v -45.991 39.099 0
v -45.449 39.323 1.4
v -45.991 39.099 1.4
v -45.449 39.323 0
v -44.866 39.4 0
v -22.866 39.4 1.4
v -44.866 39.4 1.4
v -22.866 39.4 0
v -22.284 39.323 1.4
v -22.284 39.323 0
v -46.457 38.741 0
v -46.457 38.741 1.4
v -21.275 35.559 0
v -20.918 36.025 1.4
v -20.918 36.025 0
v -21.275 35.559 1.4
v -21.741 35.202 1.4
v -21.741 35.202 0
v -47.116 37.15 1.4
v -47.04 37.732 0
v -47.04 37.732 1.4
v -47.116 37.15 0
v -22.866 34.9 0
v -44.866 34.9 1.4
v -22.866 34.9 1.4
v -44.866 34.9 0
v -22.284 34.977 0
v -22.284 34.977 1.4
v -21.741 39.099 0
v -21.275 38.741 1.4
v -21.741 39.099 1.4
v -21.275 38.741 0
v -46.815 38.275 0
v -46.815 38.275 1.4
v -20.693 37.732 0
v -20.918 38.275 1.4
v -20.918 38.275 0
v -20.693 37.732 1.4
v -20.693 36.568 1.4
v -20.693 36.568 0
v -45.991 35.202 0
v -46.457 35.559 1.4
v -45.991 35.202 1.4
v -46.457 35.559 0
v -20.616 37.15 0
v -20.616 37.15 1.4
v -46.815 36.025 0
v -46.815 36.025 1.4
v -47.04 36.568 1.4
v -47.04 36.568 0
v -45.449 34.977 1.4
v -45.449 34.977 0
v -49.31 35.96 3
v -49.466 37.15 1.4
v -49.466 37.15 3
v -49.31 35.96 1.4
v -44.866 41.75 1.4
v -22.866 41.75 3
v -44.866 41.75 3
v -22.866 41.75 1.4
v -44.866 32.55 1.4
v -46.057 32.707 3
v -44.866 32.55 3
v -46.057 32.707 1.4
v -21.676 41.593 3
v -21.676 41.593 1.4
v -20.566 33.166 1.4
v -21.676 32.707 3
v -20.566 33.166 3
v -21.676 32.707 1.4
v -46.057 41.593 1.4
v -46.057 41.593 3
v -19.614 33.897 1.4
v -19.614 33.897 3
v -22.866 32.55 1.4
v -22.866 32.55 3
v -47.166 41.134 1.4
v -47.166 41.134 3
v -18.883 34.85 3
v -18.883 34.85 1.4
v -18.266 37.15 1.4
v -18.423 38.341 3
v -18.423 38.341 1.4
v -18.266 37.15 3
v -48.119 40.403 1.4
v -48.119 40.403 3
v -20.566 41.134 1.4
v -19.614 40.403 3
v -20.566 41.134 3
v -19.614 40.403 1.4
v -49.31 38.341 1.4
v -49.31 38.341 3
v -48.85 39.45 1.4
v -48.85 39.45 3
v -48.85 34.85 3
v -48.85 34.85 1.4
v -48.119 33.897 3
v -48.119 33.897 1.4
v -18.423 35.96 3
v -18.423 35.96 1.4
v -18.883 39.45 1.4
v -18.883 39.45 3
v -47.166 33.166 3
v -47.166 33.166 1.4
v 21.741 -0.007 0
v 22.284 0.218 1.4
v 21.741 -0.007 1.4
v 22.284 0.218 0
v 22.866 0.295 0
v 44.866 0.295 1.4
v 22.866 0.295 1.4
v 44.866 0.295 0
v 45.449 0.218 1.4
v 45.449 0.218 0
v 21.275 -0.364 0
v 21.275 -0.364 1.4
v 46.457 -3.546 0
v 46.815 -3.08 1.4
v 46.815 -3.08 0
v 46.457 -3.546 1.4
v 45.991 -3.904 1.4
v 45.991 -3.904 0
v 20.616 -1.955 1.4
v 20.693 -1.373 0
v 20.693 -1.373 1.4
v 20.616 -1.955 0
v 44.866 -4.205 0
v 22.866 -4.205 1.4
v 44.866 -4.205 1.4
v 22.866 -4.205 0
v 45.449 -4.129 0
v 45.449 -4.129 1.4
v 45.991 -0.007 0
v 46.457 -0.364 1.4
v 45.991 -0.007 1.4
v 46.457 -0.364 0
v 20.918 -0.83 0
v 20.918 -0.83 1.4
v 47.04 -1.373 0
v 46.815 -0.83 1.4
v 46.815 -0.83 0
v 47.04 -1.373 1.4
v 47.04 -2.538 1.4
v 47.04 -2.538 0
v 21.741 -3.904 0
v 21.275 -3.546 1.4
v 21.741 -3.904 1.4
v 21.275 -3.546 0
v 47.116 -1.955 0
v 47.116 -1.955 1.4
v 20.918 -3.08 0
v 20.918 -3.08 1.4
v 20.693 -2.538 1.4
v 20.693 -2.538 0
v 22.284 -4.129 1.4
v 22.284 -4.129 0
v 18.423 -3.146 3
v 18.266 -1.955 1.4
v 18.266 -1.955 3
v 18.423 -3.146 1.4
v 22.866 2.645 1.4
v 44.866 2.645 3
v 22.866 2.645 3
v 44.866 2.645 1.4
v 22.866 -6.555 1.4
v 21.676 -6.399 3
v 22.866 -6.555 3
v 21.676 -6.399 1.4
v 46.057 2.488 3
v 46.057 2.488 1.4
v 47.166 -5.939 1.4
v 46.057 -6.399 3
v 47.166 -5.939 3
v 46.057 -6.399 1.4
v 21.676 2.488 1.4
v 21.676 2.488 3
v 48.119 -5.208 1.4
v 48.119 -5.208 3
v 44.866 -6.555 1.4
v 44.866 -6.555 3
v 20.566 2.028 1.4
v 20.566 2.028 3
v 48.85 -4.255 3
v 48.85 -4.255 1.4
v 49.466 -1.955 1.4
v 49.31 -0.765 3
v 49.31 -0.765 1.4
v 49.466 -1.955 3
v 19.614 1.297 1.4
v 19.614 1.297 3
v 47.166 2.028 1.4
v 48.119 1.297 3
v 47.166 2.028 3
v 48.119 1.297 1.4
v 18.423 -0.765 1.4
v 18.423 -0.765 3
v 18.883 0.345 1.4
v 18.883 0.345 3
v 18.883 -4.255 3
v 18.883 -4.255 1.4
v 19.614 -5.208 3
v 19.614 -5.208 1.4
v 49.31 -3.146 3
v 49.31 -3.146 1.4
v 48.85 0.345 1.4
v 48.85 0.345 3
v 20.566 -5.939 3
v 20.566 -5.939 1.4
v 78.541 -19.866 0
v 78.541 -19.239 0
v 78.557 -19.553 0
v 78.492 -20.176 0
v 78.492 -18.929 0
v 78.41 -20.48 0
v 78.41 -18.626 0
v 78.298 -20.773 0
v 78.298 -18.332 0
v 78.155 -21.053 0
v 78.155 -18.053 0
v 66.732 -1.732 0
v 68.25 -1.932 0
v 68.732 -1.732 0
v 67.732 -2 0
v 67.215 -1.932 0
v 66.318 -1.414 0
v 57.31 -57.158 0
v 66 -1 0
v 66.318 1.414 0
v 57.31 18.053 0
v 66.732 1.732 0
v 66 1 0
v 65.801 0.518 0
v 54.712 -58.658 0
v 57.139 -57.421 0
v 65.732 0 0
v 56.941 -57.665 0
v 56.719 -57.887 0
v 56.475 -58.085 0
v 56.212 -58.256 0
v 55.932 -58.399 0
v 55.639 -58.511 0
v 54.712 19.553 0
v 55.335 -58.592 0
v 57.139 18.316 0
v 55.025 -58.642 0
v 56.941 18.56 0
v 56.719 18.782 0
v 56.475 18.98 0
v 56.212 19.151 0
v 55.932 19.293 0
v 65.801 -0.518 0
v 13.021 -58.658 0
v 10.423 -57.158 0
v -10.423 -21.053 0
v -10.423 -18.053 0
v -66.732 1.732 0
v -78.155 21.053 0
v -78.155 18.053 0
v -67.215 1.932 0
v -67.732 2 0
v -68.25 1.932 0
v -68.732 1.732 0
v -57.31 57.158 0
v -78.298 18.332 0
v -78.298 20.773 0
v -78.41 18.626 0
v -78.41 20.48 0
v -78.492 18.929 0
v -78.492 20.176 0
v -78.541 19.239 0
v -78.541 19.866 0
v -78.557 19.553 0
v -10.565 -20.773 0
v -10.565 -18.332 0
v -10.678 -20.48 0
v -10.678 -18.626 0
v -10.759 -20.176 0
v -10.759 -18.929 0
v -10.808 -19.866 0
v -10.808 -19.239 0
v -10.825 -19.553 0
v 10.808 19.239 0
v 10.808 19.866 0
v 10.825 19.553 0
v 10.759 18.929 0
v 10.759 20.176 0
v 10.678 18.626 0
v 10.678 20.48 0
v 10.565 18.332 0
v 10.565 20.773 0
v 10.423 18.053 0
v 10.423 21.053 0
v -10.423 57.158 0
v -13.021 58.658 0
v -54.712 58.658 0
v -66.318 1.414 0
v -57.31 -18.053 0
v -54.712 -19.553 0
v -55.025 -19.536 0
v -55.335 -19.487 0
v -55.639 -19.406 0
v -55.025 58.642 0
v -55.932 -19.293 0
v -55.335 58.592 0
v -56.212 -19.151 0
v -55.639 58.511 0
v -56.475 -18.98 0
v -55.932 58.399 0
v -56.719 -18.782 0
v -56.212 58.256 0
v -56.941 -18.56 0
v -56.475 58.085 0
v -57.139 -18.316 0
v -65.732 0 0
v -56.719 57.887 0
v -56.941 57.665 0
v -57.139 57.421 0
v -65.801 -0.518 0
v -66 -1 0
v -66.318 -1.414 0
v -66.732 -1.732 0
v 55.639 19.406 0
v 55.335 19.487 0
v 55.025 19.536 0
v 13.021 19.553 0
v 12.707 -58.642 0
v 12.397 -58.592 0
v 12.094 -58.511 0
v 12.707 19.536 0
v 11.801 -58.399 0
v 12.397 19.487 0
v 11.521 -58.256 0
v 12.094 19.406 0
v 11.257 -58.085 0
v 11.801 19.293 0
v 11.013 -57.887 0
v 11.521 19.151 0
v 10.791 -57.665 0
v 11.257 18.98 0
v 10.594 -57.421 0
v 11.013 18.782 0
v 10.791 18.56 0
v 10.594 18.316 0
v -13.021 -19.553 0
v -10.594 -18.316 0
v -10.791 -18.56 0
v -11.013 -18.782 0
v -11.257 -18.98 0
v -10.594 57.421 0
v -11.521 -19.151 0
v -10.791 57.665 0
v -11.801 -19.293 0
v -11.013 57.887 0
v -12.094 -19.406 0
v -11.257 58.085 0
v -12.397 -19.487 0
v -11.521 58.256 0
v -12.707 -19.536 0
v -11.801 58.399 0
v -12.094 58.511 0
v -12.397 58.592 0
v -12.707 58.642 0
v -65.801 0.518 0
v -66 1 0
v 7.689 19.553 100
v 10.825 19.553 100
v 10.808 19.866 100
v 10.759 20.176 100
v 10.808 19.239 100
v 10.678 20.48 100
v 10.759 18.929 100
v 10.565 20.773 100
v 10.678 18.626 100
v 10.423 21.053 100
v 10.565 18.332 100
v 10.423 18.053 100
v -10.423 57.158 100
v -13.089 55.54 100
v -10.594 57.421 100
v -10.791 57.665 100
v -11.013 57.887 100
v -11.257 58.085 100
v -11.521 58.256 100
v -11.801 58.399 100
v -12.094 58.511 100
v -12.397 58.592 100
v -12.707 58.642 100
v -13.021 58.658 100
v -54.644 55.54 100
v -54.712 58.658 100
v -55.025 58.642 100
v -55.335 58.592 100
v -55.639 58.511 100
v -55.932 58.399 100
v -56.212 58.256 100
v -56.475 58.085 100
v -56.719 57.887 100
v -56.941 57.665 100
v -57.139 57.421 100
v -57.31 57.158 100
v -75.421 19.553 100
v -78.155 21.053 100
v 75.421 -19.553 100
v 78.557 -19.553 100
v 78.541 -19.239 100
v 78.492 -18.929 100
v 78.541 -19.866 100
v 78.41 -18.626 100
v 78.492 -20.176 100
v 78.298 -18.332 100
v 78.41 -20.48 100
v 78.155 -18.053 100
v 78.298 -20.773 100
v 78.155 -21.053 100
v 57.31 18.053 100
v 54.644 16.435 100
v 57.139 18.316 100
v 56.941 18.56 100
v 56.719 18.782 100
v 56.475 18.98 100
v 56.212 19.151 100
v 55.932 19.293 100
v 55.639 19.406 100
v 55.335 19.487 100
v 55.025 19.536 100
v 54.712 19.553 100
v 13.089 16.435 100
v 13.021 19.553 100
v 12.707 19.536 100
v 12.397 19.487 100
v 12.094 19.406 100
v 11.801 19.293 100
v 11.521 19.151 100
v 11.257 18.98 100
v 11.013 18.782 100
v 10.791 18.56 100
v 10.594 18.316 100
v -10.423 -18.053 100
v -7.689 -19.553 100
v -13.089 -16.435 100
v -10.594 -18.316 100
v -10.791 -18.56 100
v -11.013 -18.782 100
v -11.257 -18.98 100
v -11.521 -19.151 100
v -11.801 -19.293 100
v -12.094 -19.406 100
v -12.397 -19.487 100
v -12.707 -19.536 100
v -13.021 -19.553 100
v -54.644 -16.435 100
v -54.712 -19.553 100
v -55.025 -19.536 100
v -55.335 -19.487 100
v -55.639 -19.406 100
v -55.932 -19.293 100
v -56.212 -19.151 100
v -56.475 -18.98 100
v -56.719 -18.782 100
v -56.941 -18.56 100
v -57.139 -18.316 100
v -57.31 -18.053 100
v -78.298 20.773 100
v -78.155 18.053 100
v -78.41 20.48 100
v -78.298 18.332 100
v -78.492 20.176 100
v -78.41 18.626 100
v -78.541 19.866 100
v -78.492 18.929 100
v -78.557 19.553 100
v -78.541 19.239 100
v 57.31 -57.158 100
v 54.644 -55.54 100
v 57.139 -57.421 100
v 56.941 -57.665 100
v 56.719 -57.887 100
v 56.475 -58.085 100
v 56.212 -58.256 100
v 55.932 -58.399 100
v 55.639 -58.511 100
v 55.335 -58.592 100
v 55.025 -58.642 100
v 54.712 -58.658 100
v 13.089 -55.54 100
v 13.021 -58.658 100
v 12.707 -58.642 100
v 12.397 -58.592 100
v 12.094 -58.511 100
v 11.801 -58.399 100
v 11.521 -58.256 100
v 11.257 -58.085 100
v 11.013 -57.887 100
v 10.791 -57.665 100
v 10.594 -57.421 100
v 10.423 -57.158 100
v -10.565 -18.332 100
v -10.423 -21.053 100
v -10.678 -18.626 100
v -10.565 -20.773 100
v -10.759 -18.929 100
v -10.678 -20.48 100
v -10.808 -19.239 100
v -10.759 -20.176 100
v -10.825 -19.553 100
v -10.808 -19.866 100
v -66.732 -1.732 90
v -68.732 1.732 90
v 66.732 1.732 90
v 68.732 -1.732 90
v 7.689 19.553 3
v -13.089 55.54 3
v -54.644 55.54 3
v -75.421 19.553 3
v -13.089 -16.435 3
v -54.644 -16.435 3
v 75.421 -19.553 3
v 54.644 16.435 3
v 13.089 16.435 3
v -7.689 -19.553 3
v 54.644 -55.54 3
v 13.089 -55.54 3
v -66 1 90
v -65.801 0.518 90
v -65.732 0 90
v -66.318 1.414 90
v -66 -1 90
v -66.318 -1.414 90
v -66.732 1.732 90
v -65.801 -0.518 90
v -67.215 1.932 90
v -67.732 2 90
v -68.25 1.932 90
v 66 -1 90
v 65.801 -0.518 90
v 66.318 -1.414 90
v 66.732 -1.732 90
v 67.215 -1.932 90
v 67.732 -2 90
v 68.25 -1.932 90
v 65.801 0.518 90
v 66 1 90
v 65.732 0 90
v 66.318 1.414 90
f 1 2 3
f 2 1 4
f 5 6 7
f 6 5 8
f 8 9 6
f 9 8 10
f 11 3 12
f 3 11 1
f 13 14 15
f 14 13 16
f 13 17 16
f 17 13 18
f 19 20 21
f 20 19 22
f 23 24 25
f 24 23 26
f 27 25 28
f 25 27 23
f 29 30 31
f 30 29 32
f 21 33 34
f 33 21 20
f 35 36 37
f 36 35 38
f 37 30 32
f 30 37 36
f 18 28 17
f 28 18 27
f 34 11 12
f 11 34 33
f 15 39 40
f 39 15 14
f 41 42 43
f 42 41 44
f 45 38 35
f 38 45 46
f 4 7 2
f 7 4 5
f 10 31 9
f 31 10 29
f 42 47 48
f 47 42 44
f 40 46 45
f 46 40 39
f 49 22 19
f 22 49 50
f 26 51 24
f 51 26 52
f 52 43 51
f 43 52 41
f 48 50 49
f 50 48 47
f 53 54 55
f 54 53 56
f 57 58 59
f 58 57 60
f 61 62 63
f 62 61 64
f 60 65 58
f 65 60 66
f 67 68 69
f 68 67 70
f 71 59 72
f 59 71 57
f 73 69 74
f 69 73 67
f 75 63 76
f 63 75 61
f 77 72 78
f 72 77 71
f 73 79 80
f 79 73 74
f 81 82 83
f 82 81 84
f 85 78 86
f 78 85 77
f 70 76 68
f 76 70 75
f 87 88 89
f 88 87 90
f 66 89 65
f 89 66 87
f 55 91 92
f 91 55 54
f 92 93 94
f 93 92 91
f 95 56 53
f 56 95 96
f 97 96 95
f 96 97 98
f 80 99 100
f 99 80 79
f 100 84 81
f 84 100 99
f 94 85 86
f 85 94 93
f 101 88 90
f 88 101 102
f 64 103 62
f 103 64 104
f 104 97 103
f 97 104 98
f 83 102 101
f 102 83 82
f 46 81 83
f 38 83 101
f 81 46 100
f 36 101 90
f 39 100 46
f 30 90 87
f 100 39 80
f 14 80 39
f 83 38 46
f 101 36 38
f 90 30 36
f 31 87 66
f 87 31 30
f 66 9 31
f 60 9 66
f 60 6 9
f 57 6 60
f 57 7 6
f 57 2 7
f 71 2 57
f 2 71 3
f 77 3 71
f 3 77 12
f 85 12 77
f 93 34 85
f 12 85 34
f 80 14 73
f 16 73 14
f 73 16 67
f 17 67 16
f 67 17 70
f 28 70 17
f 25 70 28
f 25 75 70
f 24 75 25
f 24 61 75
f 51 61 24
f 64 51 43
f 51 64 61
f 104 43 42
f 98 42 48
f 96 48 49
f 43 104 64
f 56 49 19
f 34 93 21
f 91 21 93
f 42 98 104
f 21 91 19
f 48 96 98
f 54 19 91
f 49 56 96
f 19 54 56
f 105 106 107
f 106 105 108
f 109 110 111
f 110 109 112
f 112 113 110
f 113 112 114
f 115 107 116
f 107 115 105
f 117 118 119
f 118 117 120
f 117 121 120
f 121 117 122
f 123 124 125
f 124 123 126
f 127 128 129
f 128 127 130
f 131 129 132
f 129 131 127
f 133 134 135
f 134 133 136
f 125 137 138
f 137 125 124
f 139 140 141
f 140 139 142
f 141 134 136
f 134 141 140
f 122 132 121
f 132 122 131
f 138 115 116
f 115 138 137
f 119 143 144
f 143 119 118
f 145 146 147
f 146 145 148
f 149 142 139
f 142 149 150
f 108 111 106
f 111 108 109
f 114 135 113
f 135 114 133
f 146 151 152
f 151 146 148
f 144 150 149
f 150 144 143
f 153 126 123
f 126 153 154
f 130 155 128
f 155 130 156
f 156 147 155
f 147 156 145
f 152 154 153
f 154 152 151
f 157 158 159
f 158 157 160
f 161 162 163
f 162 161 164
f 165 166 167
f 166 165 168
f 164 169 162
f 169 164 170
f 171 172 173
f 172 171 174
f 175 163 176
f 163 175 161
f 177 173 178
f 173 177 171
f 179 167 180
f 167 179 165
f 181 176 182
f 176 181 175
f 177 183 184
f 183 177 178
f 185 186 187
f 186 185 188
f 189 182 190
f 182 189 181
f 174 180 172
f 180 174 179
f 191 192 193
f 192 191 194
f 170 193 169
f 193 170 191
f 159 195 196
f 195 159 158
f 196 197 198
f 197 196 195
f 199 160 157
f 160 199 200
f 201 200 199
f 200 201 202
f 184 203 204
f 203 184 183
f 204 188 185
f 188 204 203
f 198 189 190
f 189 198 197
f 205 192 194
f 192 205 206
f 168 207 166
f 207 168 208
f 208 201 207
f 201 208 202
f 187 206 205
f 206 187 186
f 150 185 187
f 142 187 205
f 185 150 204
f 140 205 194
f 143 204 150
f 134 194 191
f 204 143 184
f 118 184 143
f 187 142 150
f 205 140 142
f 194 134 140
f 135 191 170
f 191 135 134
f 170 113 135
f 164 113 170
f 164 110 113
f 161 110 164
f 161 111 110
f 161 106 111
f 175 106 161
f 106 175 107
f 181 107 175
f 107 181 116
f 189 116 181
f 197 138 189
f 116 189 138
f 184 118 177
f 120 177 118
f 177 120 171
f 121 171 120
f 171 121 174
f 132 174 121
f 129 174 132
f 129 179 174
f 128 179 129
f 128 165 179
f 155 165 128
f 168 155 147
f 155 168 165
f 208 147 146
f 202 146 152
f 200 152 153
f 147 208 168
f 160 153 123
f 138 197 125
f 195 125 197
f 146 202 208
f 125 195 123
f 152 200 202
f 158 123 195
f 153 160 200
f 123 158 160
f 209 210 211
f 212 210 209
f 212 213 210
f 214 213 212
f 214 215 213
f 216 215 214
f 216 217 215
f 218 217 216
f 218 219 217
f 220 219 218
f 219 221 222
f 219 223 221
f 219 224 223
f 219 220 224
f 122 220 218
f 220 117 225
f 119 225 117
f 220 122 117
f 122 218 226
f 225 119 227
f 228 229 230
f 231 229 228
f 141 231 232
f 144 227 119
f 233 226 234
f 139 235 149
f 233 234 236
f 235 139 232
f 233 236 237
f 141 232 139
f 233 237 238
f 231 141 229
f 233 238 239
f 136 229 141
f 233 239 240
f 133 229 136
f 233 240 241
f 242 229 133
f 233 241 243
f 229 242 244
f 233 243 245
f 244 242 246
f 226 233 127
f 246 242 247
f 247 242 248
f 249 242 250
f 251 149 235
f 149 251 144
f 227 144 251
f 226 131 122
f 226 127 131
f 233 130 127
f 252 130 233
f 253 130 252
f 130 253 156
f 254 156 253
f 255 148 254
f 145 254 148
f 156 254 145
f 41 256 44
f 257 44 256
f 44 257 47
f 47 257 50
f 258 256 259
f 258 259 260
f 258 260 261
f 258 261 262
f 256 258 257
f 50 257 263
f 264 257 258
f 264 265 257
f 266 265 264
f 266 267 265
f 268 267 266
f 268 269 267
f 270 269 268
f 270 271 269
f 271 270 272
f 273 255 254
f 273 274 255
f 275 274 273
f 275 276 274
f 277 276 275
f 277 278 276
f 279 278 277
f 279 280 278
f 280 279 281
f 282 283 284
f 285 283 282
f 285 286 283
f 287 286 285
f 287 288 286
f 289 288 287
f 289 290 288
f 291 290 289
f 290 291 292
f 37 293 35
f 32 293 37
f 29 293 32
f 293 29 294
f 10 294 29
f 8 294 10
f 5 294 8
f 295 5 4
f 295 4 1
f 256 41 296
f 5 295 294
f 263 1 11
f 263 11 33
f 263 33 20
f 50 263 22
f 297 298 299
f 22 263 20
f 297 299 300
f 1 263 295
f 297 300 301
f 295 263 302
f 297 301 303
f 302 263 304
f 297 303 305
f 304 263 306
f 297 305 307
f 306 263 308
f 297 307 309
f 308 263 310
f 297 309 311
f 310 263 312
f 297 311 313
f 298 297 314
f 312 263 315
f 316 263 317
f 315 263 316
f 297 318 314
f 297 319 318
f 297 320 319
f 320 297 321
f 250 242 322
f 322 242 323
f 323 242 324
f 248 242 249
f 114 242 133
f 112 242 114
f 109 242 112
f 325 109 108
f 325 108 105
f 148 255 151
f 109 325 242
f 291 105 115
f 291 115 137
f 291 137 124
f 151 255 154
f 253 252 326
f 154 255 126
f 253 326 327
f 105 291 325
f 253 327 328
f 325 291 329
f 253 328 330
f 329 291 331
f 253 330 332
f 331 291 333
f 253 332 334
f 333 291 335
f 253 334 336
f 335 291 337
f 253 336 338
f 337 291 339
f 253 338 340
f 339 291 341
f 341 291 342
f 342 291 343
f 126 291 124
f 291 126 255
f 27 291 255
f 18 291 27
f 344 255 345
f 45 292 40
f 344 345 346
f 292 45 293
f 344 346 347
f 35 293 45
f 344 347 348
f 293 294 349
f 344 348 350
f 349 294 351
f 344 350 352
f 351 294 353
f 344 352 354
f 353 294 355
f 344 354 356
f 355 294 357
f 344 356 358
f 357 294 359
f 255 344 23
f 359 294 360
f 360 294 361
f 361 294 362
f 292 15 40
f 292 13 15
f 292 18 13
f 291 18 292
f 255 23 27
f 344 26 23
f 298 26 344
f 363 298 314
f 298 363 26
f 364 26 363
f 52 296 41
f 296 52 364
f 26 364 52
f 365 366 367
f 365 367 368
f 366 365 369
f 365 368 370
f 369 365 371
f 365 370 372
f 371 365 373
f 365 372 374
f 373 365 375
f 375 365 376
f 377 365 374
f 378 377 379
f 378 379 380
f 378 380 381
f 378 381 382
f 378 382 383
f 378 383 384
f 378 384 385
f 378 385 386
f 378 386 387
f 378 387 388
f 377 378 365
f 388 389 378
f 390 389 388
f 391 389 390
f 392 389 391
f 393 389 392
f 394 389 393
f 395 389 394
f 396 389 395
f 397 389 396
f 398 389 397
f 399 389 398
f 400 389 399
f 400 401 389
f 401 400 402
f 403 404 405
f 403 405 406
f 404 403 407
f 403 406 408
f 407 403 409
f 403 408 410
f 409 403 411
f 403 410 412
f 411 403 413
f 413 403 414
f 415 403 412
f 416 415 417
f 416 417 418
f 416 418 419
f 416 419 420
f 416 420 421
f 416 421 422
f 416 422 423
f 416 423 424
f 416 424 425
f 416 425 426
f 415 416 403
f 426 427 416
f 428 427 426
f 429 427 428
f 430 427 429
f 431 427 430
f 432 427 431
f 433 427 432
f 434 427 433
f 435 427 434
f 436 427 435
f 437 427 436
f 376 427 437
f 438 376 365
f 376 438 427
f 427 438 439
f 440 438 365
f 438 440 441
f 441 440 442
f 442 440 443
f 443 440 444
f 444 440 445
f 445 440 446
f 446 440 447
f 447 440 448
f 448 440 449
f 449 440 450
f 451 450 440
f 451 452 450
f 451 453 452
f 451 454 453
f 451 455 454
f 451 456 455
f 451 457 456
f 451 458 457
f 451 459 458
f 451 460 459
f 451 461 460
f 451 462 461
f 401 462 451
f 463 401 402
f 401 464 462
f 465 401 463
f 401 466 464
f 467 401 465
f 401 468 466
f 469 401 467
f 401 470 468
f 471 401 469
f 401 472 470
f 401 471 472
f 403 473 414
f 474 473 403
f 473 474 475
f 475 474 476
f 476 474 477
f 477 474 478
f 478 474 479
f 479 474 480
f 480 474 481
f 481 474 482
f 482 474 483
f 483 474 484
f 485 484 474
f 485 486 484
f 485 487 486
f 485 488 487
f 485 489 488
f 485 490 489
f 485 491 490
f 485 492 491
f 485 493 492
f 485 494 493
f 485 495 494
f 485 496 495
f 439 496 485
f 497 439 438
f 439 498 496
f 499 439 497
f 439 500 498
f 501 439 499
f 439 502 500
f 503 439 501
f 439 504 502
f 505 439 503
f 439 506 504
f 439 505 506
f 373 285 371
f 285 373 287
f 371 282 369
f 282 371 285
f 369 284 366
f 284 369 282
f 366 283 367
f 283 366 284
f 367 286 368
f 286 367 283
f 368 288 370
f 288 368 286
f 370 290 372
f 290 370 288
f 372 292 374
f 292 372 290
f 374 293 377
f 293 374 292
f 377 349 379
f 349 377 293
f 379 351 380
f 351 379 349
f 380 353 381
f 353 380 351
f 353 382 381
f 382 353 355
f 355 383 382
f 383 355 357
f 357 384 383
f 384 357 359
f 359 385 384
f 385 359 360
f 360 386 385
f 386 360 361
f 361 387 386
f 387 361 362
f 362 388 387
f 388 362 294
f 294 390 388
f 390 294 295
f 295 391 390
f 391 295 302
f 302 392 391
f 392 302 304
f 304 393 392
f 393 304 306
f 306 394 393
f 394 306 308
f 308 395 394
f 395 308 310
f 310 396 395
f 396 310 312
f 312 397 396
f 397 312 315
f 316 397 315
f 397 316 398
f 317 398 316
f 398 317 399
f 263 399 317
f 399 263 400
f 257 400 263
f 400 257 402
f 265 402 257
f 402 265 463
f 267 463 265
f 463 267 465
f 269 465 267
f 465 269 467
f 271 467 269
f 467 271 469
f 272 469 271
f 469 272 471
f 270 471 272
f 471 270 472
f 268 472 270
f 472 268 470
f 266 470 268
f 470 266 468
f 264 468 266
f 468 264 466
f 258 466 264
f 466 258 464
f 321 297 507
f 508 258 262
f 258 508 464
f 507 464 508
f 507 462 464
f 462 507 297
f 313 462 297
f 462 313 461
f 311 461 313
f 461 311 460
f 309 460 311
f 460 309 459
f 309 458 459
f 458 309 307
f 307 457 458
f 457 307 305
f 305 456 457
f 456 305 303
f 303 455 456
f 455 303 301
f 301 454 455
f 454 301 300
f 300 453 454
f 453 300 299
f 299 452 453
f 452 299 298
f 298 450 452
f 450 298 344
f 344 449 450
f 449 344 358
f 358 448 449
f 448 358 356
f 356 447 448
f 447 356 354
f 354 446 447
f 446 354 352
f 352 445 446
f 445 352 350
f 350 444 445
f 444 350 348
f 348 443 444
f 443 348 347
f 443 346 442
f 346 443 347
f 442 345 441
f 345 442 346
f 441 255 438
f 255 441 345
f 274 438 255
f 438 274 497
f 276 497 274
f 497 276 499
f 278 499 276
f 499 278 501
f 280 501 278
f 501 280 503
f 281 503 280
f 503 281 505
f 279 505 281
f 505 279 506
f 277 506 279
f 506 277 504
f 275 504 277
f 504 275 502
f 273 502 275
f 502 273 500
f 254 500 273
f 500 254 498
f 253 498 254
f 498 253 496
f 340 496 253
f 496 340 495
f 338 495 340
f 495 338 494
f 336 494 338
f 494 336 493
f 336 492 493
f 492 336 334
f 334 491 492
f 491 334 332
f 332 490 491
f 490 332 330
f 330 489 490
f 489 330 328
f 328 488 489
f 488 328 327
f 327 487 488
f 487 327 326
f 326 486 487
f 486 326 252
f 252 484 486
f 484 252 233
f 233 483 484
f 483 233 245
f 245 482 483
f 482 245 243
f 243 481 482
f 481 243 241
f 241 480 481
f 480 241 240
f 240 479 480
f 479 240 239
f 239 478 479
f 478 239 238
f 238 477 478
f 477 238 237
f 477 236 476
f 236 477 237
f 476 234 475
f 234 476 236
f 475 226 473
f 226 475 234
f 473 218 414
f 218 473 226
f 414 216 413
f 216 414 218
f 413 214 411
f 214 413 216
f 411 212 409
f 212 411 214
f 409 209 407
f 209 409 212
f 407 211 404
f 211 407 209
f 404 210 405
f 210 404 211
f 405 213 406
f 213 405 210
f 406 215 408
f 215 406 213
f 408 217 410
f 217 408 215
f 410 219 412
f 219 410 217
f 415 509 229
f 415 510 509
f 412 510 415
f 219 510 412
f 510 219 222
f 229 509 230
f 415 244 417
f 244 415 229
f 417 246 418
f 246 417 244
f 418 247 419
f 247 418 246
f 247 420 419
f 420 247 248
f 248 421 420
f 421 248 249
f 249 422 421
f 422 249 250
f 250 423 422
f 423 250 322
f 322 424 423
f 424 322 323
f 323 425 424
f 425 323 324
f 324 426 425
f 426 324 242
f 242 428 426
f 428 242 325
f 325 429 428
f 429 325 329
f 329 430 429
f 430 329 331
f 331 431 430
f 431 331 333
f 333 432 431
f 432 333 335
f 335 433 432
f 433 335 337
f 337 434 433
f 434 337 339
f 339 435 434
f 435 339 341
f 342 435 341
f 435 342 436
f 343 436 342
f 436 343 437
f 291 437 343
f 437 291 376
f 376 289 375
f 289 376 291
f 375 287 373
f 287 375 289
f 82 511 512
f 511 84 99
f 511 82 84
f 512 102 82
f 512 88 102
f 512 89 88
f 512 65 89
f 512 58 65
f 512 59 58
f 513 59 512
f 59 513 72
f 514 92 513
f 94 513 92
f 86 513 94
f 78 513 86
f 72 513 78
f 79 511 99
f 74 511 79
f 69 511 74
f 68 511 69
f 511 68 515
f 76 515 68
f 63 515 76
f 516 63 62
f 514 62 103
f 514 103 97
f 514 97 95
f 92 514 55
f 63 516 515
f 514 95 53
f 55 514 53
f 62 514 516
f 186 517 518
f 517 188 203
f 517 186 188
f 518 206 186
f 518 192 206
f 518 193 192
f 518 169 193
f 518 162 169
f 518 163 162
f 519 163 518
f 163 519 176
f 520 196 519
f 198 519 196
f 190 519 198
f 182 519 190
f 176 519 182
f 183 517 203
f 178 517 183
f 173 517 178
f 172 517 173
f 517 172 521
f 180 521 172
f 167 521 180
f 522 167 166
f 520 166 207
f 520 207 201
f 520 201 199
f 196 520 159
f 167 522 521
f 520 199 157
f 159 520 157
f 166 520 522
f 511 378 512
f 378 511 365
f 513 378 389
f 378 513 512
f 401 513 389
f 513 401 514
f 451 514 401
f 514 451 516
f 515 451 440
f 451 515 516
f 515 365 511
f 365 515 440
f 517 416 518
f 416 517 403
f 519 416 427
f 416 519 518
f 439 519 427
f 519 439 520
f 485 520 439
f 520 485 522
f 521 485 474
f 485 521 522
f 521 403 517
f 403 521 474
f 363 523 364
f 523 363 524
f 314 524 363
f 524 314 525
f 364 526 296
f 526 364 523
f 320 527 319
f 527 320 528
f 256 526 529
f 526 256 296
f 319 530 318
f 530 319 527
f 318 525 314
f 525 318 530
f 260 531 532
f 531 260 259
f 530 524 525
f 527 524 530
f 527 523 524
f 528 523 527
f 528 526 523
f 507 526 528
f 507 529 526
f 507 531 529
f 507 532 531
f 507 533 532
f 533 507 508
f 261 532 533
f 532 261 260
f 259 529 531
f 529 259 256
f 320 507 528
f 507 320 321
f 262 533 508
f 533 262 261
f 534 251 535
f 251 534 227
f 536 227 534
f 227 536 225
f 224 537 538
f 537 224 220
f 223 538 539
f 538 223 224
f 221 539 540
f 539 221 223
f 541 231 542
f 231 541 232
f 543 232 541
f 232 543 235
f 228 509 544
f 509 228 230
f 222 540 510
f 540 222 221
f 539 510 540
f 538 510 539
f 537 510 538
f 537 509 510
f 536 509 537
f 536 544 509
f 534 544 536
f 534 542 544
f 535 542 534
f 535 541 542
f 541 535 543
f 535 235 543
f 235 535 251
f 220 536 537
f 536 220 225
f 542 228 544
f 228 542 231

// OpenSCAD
/* ==============================================================================
   DIAGONAL HEXAGONAL SHELF MODULE (SINGLE MODULE)
   ==============================================================================
   - A single module consisting of 2 hexagons touching on their sloped sides.
   - Diagonally arranged from upper-left to bottom-right.
   - Perfectly flat horizontal bottoms to store items.
   - Flat sides alternate by half a hexagon height.
   - Includes solid back wall and integrated adjustable mounting screw slots.
   - No tongue-and-groove or visible interlocking joints.
   - Sized so that 3 modules span exactly 16 inches horizontally (HEX_RADIUS = 45.155 mm).
   - Bounding box is ~158mm x 117mm, easily fitting onto a 26cm x 26cm bed!
   - Features clever, invisible, 3D-printer-friendly vertical half-cylindrical 
     grooves on the outer sloped mating faces. These form 4.0mm diameter pin holes
     when assembled side-by-side. Slide a 3D-printed pin from the back to align
     and structurally lock modules together without any visible connectors from the front.
   ============================================================================== */

// [HEXAGON DIMENSIONS]
// Circumradius of each hexagon (in mm). 45.155mm makes 3 modules span exactly 16 inches.
HEX_RADIUS = 45.155; // [35:0.1:80]

// Shelf depth extending from wall (in mm)
SHELF_DEPTH = 100.0; // [60:5:180]

// Perimeter and divider wall thickness (in mm)
WALL_THICKNESS = 3.6; // [2.5:0.2:6.0]

// Solid rear back wall thickness (in mm)
BACK_WALL_THICKNESS = 3.0; // [2.0:0.5:6.0]

// Fillet / corner radius on hexagon vertices (in mm)
CORNER_RADIUS = 3.0; // [0:0.5:8]

// [WALL MOUNTING CONFIGURATION]
// Enable mounting screw holes in the solid back wall
ENABLE_WALL_MOUNTS = true;

// Screw shank diameter (in mm, #8 wood screw = 4.2mm, #10 = 4.8mm)
SCREW_SHANK_DIA = 4.5; // [3:0.5:6]

// Screw head diameter for countersink / keyhole (in mm)
SCREW_HEAD_DIA = 9.2; // [7:0.5:12]

// Stud adjustment slot width (in mm, gives horizontal leeway to hit 16" studs)
STUD_SLOT_LENGTH = 22.0; // [10:2:35]

// [CLEVER SIDE-ALIGNMENT CONNECTORS]
// Radius of the alignment pin (in mm). 2.0mm = 4.0mm diameter pin.
PIN_RADIUS = 2.0; // [1.0:0.1:3.5]

// Depth of the pin groove from the back (in mm). Stops 10mm from the front to be invisible.
GROOVE_DEPTH = 90.0; // [30:5:170]

$fn = $preview ? 36 : 60;

// Resolve inradius
inrad = HEX_RADIUS * cos(30);

// Coordinates of the 2-Hex Diagonal Cluster
// Hex 1 is on upper-left, Hex 2 is on bottom-right
function get_hex_centers(r = HEX_RADIUS) = [
    [-0.75 * r, inrad / 2], // Upper-left
    [0.75 * r, -inrad / 2]  // Bottom-right
];

module single_hex_2d(r, corner_r = CORNER_RADIUS) {
    if (corner_r > 0) {
        offset(r = corner_r) offset(delta = -corner_r) circle(r = r, $fn = 6);
    } else {
        circle(r = r, $fn = 6);
    }
}

// Full outer envelope (2D)
module cluster_outer_2d(r = HEX_RADIUS) {
    pts = get_hex_centers(r);
    union() {
        for (p = pts) {
            translate(p) single_hex_2d(r, CORNER_RADIUS);
        }
    }
}

// Inner open cavities (2D)
module cluster_inner_2d(r = HEX_RADIUS, wall = WALL_THICKNESS) {
    pts = get_hex_centers(r);
    union() {
        for (p = pts) {
            translate(p) single_hex_2d(r - wall, max(0, CORNER_RADIUS - wall));
        }
    }
}

// Mounting screw slot
module wall_mount_slot(back_thick = BACK_WALL_THICKNESS) {
    union() {
        // Screw shank slot
        hull() {
            translate([-STUD_SLOT_LENGTH / 2, 0, -1]) cylinder(r = SCREW_SHANK_DIA / 2, h = back_thick + 2, $fn = 24);
            translate([STUD_SLOT_LENGTH / 2, 0, -1]) cylinder(r = SCREW_SHANK_DIA / 2, h = back_thick + 2, $fn = 24);
        }
        // Front countersink recess for screw head (inside the shelf cell)
        translate([0, 0, back_thick - 1.6]) {
            hull() {
                translate([-STUD_SLOT_LENGTH / 2, 0, 0]) cylinder(r = SCREW_HEAD_DIA / 2, h = back_thick, $fn = 24);
                translate([STUD_SLOT_LENGTH / 2, 0, 0]) cylinder(r = SCREW_HEAD_DIA / 2, h = back_thick, $fn = 24);
            }
        }
    }
}

// Apply mounting holes to the solid back wall
module apply_wall_mount_holes(r = HEX_RADIUS) {
    pts = get_hex_centers(r);
    for (p = pts) {
        // Place mount hole near the upper center of each hexagon
        translate([p[0], p[1] + inrad * 0.45, 0]) {
            wall_mount_slot(BACK_WALL_THICKNESS);
        }
    }
}

// Build the shelf in 3D
module diagonal_hex_shelf(r = HEX_RADIUS, depth_z = SHELF_DEPTH) {
    difference() {
        // 1. Solid Outer Shell & Solid Back Wall
        linear_extrude(height = depth_z) {
            cluster_outer_2d(r);
        }
        
        // 2. Hollow Out Cavities (Leaves solid back wall)
        translate([0, 0, BACK_WALL_THICKNESS]) {
            linear_extrude(height = depth_z + 1) {
                cluster_inner_2d(r, WALL_THICKNESS);
            }
        }
        
        // 3. Mounting Screw Holes through the Back Wall
        if (ENABLE_WALL_MOUNTS) {
            apply_wall_mount_holes(r);
        }
        
        // 4. Clever invisible side-alignment grooves (vertical half-cylinders)
        // Stops 10mm from front face to be 100% hidden.
        // Left sloped mating face groove (at [-1.5 * r, 0])
        translate([-1.5 * r, 0, -1]) {
            cylinder(r = PIN_RADIUS, h = GROOVE_DEPTH + 1, $fn = 24);
        }
        // Right sloped mating face groove (at [1.5 * r, 0])
        translate([1.5 * r, 0, -1]) {
            cylinder(r = PIN_RADIUS, h = GROOVE_DEPTH + 1, $fn = 24);
        }
    }
}

// Optional: Render a small helper visualizer of the sliding connection pin (dowel) next to the shelf
render_helper_pin = false;

if (render_helper_pin) {
    translate([HEX_RADIUS * 2, 0, 0]) {
        color([0.7, 0.7, 0.7]) {
            // Chamfered ends for smooth slide-in
            cylinder(r1 = PIN_RADIUS - 0.5, r2 = PIN_RADIUS - 0.15, h = 1.5, $fn = 20);
            translate([0, 0, 1.5]) cylinder(r = PIN_RADIUS - 0.15, h = GROOVE_DEPTH - 3.5, $fn = 20);
            translate([0, 0, GROOVE_DEPTH - 2]) cylinder(r1 = PIN_RADIUS - 0.15, r2 = PIN_RADIUS - 0.5, h = 1.5, $fn = 20);
        }
    }
}

// Render the single module
diagonal_hex_shelf();
